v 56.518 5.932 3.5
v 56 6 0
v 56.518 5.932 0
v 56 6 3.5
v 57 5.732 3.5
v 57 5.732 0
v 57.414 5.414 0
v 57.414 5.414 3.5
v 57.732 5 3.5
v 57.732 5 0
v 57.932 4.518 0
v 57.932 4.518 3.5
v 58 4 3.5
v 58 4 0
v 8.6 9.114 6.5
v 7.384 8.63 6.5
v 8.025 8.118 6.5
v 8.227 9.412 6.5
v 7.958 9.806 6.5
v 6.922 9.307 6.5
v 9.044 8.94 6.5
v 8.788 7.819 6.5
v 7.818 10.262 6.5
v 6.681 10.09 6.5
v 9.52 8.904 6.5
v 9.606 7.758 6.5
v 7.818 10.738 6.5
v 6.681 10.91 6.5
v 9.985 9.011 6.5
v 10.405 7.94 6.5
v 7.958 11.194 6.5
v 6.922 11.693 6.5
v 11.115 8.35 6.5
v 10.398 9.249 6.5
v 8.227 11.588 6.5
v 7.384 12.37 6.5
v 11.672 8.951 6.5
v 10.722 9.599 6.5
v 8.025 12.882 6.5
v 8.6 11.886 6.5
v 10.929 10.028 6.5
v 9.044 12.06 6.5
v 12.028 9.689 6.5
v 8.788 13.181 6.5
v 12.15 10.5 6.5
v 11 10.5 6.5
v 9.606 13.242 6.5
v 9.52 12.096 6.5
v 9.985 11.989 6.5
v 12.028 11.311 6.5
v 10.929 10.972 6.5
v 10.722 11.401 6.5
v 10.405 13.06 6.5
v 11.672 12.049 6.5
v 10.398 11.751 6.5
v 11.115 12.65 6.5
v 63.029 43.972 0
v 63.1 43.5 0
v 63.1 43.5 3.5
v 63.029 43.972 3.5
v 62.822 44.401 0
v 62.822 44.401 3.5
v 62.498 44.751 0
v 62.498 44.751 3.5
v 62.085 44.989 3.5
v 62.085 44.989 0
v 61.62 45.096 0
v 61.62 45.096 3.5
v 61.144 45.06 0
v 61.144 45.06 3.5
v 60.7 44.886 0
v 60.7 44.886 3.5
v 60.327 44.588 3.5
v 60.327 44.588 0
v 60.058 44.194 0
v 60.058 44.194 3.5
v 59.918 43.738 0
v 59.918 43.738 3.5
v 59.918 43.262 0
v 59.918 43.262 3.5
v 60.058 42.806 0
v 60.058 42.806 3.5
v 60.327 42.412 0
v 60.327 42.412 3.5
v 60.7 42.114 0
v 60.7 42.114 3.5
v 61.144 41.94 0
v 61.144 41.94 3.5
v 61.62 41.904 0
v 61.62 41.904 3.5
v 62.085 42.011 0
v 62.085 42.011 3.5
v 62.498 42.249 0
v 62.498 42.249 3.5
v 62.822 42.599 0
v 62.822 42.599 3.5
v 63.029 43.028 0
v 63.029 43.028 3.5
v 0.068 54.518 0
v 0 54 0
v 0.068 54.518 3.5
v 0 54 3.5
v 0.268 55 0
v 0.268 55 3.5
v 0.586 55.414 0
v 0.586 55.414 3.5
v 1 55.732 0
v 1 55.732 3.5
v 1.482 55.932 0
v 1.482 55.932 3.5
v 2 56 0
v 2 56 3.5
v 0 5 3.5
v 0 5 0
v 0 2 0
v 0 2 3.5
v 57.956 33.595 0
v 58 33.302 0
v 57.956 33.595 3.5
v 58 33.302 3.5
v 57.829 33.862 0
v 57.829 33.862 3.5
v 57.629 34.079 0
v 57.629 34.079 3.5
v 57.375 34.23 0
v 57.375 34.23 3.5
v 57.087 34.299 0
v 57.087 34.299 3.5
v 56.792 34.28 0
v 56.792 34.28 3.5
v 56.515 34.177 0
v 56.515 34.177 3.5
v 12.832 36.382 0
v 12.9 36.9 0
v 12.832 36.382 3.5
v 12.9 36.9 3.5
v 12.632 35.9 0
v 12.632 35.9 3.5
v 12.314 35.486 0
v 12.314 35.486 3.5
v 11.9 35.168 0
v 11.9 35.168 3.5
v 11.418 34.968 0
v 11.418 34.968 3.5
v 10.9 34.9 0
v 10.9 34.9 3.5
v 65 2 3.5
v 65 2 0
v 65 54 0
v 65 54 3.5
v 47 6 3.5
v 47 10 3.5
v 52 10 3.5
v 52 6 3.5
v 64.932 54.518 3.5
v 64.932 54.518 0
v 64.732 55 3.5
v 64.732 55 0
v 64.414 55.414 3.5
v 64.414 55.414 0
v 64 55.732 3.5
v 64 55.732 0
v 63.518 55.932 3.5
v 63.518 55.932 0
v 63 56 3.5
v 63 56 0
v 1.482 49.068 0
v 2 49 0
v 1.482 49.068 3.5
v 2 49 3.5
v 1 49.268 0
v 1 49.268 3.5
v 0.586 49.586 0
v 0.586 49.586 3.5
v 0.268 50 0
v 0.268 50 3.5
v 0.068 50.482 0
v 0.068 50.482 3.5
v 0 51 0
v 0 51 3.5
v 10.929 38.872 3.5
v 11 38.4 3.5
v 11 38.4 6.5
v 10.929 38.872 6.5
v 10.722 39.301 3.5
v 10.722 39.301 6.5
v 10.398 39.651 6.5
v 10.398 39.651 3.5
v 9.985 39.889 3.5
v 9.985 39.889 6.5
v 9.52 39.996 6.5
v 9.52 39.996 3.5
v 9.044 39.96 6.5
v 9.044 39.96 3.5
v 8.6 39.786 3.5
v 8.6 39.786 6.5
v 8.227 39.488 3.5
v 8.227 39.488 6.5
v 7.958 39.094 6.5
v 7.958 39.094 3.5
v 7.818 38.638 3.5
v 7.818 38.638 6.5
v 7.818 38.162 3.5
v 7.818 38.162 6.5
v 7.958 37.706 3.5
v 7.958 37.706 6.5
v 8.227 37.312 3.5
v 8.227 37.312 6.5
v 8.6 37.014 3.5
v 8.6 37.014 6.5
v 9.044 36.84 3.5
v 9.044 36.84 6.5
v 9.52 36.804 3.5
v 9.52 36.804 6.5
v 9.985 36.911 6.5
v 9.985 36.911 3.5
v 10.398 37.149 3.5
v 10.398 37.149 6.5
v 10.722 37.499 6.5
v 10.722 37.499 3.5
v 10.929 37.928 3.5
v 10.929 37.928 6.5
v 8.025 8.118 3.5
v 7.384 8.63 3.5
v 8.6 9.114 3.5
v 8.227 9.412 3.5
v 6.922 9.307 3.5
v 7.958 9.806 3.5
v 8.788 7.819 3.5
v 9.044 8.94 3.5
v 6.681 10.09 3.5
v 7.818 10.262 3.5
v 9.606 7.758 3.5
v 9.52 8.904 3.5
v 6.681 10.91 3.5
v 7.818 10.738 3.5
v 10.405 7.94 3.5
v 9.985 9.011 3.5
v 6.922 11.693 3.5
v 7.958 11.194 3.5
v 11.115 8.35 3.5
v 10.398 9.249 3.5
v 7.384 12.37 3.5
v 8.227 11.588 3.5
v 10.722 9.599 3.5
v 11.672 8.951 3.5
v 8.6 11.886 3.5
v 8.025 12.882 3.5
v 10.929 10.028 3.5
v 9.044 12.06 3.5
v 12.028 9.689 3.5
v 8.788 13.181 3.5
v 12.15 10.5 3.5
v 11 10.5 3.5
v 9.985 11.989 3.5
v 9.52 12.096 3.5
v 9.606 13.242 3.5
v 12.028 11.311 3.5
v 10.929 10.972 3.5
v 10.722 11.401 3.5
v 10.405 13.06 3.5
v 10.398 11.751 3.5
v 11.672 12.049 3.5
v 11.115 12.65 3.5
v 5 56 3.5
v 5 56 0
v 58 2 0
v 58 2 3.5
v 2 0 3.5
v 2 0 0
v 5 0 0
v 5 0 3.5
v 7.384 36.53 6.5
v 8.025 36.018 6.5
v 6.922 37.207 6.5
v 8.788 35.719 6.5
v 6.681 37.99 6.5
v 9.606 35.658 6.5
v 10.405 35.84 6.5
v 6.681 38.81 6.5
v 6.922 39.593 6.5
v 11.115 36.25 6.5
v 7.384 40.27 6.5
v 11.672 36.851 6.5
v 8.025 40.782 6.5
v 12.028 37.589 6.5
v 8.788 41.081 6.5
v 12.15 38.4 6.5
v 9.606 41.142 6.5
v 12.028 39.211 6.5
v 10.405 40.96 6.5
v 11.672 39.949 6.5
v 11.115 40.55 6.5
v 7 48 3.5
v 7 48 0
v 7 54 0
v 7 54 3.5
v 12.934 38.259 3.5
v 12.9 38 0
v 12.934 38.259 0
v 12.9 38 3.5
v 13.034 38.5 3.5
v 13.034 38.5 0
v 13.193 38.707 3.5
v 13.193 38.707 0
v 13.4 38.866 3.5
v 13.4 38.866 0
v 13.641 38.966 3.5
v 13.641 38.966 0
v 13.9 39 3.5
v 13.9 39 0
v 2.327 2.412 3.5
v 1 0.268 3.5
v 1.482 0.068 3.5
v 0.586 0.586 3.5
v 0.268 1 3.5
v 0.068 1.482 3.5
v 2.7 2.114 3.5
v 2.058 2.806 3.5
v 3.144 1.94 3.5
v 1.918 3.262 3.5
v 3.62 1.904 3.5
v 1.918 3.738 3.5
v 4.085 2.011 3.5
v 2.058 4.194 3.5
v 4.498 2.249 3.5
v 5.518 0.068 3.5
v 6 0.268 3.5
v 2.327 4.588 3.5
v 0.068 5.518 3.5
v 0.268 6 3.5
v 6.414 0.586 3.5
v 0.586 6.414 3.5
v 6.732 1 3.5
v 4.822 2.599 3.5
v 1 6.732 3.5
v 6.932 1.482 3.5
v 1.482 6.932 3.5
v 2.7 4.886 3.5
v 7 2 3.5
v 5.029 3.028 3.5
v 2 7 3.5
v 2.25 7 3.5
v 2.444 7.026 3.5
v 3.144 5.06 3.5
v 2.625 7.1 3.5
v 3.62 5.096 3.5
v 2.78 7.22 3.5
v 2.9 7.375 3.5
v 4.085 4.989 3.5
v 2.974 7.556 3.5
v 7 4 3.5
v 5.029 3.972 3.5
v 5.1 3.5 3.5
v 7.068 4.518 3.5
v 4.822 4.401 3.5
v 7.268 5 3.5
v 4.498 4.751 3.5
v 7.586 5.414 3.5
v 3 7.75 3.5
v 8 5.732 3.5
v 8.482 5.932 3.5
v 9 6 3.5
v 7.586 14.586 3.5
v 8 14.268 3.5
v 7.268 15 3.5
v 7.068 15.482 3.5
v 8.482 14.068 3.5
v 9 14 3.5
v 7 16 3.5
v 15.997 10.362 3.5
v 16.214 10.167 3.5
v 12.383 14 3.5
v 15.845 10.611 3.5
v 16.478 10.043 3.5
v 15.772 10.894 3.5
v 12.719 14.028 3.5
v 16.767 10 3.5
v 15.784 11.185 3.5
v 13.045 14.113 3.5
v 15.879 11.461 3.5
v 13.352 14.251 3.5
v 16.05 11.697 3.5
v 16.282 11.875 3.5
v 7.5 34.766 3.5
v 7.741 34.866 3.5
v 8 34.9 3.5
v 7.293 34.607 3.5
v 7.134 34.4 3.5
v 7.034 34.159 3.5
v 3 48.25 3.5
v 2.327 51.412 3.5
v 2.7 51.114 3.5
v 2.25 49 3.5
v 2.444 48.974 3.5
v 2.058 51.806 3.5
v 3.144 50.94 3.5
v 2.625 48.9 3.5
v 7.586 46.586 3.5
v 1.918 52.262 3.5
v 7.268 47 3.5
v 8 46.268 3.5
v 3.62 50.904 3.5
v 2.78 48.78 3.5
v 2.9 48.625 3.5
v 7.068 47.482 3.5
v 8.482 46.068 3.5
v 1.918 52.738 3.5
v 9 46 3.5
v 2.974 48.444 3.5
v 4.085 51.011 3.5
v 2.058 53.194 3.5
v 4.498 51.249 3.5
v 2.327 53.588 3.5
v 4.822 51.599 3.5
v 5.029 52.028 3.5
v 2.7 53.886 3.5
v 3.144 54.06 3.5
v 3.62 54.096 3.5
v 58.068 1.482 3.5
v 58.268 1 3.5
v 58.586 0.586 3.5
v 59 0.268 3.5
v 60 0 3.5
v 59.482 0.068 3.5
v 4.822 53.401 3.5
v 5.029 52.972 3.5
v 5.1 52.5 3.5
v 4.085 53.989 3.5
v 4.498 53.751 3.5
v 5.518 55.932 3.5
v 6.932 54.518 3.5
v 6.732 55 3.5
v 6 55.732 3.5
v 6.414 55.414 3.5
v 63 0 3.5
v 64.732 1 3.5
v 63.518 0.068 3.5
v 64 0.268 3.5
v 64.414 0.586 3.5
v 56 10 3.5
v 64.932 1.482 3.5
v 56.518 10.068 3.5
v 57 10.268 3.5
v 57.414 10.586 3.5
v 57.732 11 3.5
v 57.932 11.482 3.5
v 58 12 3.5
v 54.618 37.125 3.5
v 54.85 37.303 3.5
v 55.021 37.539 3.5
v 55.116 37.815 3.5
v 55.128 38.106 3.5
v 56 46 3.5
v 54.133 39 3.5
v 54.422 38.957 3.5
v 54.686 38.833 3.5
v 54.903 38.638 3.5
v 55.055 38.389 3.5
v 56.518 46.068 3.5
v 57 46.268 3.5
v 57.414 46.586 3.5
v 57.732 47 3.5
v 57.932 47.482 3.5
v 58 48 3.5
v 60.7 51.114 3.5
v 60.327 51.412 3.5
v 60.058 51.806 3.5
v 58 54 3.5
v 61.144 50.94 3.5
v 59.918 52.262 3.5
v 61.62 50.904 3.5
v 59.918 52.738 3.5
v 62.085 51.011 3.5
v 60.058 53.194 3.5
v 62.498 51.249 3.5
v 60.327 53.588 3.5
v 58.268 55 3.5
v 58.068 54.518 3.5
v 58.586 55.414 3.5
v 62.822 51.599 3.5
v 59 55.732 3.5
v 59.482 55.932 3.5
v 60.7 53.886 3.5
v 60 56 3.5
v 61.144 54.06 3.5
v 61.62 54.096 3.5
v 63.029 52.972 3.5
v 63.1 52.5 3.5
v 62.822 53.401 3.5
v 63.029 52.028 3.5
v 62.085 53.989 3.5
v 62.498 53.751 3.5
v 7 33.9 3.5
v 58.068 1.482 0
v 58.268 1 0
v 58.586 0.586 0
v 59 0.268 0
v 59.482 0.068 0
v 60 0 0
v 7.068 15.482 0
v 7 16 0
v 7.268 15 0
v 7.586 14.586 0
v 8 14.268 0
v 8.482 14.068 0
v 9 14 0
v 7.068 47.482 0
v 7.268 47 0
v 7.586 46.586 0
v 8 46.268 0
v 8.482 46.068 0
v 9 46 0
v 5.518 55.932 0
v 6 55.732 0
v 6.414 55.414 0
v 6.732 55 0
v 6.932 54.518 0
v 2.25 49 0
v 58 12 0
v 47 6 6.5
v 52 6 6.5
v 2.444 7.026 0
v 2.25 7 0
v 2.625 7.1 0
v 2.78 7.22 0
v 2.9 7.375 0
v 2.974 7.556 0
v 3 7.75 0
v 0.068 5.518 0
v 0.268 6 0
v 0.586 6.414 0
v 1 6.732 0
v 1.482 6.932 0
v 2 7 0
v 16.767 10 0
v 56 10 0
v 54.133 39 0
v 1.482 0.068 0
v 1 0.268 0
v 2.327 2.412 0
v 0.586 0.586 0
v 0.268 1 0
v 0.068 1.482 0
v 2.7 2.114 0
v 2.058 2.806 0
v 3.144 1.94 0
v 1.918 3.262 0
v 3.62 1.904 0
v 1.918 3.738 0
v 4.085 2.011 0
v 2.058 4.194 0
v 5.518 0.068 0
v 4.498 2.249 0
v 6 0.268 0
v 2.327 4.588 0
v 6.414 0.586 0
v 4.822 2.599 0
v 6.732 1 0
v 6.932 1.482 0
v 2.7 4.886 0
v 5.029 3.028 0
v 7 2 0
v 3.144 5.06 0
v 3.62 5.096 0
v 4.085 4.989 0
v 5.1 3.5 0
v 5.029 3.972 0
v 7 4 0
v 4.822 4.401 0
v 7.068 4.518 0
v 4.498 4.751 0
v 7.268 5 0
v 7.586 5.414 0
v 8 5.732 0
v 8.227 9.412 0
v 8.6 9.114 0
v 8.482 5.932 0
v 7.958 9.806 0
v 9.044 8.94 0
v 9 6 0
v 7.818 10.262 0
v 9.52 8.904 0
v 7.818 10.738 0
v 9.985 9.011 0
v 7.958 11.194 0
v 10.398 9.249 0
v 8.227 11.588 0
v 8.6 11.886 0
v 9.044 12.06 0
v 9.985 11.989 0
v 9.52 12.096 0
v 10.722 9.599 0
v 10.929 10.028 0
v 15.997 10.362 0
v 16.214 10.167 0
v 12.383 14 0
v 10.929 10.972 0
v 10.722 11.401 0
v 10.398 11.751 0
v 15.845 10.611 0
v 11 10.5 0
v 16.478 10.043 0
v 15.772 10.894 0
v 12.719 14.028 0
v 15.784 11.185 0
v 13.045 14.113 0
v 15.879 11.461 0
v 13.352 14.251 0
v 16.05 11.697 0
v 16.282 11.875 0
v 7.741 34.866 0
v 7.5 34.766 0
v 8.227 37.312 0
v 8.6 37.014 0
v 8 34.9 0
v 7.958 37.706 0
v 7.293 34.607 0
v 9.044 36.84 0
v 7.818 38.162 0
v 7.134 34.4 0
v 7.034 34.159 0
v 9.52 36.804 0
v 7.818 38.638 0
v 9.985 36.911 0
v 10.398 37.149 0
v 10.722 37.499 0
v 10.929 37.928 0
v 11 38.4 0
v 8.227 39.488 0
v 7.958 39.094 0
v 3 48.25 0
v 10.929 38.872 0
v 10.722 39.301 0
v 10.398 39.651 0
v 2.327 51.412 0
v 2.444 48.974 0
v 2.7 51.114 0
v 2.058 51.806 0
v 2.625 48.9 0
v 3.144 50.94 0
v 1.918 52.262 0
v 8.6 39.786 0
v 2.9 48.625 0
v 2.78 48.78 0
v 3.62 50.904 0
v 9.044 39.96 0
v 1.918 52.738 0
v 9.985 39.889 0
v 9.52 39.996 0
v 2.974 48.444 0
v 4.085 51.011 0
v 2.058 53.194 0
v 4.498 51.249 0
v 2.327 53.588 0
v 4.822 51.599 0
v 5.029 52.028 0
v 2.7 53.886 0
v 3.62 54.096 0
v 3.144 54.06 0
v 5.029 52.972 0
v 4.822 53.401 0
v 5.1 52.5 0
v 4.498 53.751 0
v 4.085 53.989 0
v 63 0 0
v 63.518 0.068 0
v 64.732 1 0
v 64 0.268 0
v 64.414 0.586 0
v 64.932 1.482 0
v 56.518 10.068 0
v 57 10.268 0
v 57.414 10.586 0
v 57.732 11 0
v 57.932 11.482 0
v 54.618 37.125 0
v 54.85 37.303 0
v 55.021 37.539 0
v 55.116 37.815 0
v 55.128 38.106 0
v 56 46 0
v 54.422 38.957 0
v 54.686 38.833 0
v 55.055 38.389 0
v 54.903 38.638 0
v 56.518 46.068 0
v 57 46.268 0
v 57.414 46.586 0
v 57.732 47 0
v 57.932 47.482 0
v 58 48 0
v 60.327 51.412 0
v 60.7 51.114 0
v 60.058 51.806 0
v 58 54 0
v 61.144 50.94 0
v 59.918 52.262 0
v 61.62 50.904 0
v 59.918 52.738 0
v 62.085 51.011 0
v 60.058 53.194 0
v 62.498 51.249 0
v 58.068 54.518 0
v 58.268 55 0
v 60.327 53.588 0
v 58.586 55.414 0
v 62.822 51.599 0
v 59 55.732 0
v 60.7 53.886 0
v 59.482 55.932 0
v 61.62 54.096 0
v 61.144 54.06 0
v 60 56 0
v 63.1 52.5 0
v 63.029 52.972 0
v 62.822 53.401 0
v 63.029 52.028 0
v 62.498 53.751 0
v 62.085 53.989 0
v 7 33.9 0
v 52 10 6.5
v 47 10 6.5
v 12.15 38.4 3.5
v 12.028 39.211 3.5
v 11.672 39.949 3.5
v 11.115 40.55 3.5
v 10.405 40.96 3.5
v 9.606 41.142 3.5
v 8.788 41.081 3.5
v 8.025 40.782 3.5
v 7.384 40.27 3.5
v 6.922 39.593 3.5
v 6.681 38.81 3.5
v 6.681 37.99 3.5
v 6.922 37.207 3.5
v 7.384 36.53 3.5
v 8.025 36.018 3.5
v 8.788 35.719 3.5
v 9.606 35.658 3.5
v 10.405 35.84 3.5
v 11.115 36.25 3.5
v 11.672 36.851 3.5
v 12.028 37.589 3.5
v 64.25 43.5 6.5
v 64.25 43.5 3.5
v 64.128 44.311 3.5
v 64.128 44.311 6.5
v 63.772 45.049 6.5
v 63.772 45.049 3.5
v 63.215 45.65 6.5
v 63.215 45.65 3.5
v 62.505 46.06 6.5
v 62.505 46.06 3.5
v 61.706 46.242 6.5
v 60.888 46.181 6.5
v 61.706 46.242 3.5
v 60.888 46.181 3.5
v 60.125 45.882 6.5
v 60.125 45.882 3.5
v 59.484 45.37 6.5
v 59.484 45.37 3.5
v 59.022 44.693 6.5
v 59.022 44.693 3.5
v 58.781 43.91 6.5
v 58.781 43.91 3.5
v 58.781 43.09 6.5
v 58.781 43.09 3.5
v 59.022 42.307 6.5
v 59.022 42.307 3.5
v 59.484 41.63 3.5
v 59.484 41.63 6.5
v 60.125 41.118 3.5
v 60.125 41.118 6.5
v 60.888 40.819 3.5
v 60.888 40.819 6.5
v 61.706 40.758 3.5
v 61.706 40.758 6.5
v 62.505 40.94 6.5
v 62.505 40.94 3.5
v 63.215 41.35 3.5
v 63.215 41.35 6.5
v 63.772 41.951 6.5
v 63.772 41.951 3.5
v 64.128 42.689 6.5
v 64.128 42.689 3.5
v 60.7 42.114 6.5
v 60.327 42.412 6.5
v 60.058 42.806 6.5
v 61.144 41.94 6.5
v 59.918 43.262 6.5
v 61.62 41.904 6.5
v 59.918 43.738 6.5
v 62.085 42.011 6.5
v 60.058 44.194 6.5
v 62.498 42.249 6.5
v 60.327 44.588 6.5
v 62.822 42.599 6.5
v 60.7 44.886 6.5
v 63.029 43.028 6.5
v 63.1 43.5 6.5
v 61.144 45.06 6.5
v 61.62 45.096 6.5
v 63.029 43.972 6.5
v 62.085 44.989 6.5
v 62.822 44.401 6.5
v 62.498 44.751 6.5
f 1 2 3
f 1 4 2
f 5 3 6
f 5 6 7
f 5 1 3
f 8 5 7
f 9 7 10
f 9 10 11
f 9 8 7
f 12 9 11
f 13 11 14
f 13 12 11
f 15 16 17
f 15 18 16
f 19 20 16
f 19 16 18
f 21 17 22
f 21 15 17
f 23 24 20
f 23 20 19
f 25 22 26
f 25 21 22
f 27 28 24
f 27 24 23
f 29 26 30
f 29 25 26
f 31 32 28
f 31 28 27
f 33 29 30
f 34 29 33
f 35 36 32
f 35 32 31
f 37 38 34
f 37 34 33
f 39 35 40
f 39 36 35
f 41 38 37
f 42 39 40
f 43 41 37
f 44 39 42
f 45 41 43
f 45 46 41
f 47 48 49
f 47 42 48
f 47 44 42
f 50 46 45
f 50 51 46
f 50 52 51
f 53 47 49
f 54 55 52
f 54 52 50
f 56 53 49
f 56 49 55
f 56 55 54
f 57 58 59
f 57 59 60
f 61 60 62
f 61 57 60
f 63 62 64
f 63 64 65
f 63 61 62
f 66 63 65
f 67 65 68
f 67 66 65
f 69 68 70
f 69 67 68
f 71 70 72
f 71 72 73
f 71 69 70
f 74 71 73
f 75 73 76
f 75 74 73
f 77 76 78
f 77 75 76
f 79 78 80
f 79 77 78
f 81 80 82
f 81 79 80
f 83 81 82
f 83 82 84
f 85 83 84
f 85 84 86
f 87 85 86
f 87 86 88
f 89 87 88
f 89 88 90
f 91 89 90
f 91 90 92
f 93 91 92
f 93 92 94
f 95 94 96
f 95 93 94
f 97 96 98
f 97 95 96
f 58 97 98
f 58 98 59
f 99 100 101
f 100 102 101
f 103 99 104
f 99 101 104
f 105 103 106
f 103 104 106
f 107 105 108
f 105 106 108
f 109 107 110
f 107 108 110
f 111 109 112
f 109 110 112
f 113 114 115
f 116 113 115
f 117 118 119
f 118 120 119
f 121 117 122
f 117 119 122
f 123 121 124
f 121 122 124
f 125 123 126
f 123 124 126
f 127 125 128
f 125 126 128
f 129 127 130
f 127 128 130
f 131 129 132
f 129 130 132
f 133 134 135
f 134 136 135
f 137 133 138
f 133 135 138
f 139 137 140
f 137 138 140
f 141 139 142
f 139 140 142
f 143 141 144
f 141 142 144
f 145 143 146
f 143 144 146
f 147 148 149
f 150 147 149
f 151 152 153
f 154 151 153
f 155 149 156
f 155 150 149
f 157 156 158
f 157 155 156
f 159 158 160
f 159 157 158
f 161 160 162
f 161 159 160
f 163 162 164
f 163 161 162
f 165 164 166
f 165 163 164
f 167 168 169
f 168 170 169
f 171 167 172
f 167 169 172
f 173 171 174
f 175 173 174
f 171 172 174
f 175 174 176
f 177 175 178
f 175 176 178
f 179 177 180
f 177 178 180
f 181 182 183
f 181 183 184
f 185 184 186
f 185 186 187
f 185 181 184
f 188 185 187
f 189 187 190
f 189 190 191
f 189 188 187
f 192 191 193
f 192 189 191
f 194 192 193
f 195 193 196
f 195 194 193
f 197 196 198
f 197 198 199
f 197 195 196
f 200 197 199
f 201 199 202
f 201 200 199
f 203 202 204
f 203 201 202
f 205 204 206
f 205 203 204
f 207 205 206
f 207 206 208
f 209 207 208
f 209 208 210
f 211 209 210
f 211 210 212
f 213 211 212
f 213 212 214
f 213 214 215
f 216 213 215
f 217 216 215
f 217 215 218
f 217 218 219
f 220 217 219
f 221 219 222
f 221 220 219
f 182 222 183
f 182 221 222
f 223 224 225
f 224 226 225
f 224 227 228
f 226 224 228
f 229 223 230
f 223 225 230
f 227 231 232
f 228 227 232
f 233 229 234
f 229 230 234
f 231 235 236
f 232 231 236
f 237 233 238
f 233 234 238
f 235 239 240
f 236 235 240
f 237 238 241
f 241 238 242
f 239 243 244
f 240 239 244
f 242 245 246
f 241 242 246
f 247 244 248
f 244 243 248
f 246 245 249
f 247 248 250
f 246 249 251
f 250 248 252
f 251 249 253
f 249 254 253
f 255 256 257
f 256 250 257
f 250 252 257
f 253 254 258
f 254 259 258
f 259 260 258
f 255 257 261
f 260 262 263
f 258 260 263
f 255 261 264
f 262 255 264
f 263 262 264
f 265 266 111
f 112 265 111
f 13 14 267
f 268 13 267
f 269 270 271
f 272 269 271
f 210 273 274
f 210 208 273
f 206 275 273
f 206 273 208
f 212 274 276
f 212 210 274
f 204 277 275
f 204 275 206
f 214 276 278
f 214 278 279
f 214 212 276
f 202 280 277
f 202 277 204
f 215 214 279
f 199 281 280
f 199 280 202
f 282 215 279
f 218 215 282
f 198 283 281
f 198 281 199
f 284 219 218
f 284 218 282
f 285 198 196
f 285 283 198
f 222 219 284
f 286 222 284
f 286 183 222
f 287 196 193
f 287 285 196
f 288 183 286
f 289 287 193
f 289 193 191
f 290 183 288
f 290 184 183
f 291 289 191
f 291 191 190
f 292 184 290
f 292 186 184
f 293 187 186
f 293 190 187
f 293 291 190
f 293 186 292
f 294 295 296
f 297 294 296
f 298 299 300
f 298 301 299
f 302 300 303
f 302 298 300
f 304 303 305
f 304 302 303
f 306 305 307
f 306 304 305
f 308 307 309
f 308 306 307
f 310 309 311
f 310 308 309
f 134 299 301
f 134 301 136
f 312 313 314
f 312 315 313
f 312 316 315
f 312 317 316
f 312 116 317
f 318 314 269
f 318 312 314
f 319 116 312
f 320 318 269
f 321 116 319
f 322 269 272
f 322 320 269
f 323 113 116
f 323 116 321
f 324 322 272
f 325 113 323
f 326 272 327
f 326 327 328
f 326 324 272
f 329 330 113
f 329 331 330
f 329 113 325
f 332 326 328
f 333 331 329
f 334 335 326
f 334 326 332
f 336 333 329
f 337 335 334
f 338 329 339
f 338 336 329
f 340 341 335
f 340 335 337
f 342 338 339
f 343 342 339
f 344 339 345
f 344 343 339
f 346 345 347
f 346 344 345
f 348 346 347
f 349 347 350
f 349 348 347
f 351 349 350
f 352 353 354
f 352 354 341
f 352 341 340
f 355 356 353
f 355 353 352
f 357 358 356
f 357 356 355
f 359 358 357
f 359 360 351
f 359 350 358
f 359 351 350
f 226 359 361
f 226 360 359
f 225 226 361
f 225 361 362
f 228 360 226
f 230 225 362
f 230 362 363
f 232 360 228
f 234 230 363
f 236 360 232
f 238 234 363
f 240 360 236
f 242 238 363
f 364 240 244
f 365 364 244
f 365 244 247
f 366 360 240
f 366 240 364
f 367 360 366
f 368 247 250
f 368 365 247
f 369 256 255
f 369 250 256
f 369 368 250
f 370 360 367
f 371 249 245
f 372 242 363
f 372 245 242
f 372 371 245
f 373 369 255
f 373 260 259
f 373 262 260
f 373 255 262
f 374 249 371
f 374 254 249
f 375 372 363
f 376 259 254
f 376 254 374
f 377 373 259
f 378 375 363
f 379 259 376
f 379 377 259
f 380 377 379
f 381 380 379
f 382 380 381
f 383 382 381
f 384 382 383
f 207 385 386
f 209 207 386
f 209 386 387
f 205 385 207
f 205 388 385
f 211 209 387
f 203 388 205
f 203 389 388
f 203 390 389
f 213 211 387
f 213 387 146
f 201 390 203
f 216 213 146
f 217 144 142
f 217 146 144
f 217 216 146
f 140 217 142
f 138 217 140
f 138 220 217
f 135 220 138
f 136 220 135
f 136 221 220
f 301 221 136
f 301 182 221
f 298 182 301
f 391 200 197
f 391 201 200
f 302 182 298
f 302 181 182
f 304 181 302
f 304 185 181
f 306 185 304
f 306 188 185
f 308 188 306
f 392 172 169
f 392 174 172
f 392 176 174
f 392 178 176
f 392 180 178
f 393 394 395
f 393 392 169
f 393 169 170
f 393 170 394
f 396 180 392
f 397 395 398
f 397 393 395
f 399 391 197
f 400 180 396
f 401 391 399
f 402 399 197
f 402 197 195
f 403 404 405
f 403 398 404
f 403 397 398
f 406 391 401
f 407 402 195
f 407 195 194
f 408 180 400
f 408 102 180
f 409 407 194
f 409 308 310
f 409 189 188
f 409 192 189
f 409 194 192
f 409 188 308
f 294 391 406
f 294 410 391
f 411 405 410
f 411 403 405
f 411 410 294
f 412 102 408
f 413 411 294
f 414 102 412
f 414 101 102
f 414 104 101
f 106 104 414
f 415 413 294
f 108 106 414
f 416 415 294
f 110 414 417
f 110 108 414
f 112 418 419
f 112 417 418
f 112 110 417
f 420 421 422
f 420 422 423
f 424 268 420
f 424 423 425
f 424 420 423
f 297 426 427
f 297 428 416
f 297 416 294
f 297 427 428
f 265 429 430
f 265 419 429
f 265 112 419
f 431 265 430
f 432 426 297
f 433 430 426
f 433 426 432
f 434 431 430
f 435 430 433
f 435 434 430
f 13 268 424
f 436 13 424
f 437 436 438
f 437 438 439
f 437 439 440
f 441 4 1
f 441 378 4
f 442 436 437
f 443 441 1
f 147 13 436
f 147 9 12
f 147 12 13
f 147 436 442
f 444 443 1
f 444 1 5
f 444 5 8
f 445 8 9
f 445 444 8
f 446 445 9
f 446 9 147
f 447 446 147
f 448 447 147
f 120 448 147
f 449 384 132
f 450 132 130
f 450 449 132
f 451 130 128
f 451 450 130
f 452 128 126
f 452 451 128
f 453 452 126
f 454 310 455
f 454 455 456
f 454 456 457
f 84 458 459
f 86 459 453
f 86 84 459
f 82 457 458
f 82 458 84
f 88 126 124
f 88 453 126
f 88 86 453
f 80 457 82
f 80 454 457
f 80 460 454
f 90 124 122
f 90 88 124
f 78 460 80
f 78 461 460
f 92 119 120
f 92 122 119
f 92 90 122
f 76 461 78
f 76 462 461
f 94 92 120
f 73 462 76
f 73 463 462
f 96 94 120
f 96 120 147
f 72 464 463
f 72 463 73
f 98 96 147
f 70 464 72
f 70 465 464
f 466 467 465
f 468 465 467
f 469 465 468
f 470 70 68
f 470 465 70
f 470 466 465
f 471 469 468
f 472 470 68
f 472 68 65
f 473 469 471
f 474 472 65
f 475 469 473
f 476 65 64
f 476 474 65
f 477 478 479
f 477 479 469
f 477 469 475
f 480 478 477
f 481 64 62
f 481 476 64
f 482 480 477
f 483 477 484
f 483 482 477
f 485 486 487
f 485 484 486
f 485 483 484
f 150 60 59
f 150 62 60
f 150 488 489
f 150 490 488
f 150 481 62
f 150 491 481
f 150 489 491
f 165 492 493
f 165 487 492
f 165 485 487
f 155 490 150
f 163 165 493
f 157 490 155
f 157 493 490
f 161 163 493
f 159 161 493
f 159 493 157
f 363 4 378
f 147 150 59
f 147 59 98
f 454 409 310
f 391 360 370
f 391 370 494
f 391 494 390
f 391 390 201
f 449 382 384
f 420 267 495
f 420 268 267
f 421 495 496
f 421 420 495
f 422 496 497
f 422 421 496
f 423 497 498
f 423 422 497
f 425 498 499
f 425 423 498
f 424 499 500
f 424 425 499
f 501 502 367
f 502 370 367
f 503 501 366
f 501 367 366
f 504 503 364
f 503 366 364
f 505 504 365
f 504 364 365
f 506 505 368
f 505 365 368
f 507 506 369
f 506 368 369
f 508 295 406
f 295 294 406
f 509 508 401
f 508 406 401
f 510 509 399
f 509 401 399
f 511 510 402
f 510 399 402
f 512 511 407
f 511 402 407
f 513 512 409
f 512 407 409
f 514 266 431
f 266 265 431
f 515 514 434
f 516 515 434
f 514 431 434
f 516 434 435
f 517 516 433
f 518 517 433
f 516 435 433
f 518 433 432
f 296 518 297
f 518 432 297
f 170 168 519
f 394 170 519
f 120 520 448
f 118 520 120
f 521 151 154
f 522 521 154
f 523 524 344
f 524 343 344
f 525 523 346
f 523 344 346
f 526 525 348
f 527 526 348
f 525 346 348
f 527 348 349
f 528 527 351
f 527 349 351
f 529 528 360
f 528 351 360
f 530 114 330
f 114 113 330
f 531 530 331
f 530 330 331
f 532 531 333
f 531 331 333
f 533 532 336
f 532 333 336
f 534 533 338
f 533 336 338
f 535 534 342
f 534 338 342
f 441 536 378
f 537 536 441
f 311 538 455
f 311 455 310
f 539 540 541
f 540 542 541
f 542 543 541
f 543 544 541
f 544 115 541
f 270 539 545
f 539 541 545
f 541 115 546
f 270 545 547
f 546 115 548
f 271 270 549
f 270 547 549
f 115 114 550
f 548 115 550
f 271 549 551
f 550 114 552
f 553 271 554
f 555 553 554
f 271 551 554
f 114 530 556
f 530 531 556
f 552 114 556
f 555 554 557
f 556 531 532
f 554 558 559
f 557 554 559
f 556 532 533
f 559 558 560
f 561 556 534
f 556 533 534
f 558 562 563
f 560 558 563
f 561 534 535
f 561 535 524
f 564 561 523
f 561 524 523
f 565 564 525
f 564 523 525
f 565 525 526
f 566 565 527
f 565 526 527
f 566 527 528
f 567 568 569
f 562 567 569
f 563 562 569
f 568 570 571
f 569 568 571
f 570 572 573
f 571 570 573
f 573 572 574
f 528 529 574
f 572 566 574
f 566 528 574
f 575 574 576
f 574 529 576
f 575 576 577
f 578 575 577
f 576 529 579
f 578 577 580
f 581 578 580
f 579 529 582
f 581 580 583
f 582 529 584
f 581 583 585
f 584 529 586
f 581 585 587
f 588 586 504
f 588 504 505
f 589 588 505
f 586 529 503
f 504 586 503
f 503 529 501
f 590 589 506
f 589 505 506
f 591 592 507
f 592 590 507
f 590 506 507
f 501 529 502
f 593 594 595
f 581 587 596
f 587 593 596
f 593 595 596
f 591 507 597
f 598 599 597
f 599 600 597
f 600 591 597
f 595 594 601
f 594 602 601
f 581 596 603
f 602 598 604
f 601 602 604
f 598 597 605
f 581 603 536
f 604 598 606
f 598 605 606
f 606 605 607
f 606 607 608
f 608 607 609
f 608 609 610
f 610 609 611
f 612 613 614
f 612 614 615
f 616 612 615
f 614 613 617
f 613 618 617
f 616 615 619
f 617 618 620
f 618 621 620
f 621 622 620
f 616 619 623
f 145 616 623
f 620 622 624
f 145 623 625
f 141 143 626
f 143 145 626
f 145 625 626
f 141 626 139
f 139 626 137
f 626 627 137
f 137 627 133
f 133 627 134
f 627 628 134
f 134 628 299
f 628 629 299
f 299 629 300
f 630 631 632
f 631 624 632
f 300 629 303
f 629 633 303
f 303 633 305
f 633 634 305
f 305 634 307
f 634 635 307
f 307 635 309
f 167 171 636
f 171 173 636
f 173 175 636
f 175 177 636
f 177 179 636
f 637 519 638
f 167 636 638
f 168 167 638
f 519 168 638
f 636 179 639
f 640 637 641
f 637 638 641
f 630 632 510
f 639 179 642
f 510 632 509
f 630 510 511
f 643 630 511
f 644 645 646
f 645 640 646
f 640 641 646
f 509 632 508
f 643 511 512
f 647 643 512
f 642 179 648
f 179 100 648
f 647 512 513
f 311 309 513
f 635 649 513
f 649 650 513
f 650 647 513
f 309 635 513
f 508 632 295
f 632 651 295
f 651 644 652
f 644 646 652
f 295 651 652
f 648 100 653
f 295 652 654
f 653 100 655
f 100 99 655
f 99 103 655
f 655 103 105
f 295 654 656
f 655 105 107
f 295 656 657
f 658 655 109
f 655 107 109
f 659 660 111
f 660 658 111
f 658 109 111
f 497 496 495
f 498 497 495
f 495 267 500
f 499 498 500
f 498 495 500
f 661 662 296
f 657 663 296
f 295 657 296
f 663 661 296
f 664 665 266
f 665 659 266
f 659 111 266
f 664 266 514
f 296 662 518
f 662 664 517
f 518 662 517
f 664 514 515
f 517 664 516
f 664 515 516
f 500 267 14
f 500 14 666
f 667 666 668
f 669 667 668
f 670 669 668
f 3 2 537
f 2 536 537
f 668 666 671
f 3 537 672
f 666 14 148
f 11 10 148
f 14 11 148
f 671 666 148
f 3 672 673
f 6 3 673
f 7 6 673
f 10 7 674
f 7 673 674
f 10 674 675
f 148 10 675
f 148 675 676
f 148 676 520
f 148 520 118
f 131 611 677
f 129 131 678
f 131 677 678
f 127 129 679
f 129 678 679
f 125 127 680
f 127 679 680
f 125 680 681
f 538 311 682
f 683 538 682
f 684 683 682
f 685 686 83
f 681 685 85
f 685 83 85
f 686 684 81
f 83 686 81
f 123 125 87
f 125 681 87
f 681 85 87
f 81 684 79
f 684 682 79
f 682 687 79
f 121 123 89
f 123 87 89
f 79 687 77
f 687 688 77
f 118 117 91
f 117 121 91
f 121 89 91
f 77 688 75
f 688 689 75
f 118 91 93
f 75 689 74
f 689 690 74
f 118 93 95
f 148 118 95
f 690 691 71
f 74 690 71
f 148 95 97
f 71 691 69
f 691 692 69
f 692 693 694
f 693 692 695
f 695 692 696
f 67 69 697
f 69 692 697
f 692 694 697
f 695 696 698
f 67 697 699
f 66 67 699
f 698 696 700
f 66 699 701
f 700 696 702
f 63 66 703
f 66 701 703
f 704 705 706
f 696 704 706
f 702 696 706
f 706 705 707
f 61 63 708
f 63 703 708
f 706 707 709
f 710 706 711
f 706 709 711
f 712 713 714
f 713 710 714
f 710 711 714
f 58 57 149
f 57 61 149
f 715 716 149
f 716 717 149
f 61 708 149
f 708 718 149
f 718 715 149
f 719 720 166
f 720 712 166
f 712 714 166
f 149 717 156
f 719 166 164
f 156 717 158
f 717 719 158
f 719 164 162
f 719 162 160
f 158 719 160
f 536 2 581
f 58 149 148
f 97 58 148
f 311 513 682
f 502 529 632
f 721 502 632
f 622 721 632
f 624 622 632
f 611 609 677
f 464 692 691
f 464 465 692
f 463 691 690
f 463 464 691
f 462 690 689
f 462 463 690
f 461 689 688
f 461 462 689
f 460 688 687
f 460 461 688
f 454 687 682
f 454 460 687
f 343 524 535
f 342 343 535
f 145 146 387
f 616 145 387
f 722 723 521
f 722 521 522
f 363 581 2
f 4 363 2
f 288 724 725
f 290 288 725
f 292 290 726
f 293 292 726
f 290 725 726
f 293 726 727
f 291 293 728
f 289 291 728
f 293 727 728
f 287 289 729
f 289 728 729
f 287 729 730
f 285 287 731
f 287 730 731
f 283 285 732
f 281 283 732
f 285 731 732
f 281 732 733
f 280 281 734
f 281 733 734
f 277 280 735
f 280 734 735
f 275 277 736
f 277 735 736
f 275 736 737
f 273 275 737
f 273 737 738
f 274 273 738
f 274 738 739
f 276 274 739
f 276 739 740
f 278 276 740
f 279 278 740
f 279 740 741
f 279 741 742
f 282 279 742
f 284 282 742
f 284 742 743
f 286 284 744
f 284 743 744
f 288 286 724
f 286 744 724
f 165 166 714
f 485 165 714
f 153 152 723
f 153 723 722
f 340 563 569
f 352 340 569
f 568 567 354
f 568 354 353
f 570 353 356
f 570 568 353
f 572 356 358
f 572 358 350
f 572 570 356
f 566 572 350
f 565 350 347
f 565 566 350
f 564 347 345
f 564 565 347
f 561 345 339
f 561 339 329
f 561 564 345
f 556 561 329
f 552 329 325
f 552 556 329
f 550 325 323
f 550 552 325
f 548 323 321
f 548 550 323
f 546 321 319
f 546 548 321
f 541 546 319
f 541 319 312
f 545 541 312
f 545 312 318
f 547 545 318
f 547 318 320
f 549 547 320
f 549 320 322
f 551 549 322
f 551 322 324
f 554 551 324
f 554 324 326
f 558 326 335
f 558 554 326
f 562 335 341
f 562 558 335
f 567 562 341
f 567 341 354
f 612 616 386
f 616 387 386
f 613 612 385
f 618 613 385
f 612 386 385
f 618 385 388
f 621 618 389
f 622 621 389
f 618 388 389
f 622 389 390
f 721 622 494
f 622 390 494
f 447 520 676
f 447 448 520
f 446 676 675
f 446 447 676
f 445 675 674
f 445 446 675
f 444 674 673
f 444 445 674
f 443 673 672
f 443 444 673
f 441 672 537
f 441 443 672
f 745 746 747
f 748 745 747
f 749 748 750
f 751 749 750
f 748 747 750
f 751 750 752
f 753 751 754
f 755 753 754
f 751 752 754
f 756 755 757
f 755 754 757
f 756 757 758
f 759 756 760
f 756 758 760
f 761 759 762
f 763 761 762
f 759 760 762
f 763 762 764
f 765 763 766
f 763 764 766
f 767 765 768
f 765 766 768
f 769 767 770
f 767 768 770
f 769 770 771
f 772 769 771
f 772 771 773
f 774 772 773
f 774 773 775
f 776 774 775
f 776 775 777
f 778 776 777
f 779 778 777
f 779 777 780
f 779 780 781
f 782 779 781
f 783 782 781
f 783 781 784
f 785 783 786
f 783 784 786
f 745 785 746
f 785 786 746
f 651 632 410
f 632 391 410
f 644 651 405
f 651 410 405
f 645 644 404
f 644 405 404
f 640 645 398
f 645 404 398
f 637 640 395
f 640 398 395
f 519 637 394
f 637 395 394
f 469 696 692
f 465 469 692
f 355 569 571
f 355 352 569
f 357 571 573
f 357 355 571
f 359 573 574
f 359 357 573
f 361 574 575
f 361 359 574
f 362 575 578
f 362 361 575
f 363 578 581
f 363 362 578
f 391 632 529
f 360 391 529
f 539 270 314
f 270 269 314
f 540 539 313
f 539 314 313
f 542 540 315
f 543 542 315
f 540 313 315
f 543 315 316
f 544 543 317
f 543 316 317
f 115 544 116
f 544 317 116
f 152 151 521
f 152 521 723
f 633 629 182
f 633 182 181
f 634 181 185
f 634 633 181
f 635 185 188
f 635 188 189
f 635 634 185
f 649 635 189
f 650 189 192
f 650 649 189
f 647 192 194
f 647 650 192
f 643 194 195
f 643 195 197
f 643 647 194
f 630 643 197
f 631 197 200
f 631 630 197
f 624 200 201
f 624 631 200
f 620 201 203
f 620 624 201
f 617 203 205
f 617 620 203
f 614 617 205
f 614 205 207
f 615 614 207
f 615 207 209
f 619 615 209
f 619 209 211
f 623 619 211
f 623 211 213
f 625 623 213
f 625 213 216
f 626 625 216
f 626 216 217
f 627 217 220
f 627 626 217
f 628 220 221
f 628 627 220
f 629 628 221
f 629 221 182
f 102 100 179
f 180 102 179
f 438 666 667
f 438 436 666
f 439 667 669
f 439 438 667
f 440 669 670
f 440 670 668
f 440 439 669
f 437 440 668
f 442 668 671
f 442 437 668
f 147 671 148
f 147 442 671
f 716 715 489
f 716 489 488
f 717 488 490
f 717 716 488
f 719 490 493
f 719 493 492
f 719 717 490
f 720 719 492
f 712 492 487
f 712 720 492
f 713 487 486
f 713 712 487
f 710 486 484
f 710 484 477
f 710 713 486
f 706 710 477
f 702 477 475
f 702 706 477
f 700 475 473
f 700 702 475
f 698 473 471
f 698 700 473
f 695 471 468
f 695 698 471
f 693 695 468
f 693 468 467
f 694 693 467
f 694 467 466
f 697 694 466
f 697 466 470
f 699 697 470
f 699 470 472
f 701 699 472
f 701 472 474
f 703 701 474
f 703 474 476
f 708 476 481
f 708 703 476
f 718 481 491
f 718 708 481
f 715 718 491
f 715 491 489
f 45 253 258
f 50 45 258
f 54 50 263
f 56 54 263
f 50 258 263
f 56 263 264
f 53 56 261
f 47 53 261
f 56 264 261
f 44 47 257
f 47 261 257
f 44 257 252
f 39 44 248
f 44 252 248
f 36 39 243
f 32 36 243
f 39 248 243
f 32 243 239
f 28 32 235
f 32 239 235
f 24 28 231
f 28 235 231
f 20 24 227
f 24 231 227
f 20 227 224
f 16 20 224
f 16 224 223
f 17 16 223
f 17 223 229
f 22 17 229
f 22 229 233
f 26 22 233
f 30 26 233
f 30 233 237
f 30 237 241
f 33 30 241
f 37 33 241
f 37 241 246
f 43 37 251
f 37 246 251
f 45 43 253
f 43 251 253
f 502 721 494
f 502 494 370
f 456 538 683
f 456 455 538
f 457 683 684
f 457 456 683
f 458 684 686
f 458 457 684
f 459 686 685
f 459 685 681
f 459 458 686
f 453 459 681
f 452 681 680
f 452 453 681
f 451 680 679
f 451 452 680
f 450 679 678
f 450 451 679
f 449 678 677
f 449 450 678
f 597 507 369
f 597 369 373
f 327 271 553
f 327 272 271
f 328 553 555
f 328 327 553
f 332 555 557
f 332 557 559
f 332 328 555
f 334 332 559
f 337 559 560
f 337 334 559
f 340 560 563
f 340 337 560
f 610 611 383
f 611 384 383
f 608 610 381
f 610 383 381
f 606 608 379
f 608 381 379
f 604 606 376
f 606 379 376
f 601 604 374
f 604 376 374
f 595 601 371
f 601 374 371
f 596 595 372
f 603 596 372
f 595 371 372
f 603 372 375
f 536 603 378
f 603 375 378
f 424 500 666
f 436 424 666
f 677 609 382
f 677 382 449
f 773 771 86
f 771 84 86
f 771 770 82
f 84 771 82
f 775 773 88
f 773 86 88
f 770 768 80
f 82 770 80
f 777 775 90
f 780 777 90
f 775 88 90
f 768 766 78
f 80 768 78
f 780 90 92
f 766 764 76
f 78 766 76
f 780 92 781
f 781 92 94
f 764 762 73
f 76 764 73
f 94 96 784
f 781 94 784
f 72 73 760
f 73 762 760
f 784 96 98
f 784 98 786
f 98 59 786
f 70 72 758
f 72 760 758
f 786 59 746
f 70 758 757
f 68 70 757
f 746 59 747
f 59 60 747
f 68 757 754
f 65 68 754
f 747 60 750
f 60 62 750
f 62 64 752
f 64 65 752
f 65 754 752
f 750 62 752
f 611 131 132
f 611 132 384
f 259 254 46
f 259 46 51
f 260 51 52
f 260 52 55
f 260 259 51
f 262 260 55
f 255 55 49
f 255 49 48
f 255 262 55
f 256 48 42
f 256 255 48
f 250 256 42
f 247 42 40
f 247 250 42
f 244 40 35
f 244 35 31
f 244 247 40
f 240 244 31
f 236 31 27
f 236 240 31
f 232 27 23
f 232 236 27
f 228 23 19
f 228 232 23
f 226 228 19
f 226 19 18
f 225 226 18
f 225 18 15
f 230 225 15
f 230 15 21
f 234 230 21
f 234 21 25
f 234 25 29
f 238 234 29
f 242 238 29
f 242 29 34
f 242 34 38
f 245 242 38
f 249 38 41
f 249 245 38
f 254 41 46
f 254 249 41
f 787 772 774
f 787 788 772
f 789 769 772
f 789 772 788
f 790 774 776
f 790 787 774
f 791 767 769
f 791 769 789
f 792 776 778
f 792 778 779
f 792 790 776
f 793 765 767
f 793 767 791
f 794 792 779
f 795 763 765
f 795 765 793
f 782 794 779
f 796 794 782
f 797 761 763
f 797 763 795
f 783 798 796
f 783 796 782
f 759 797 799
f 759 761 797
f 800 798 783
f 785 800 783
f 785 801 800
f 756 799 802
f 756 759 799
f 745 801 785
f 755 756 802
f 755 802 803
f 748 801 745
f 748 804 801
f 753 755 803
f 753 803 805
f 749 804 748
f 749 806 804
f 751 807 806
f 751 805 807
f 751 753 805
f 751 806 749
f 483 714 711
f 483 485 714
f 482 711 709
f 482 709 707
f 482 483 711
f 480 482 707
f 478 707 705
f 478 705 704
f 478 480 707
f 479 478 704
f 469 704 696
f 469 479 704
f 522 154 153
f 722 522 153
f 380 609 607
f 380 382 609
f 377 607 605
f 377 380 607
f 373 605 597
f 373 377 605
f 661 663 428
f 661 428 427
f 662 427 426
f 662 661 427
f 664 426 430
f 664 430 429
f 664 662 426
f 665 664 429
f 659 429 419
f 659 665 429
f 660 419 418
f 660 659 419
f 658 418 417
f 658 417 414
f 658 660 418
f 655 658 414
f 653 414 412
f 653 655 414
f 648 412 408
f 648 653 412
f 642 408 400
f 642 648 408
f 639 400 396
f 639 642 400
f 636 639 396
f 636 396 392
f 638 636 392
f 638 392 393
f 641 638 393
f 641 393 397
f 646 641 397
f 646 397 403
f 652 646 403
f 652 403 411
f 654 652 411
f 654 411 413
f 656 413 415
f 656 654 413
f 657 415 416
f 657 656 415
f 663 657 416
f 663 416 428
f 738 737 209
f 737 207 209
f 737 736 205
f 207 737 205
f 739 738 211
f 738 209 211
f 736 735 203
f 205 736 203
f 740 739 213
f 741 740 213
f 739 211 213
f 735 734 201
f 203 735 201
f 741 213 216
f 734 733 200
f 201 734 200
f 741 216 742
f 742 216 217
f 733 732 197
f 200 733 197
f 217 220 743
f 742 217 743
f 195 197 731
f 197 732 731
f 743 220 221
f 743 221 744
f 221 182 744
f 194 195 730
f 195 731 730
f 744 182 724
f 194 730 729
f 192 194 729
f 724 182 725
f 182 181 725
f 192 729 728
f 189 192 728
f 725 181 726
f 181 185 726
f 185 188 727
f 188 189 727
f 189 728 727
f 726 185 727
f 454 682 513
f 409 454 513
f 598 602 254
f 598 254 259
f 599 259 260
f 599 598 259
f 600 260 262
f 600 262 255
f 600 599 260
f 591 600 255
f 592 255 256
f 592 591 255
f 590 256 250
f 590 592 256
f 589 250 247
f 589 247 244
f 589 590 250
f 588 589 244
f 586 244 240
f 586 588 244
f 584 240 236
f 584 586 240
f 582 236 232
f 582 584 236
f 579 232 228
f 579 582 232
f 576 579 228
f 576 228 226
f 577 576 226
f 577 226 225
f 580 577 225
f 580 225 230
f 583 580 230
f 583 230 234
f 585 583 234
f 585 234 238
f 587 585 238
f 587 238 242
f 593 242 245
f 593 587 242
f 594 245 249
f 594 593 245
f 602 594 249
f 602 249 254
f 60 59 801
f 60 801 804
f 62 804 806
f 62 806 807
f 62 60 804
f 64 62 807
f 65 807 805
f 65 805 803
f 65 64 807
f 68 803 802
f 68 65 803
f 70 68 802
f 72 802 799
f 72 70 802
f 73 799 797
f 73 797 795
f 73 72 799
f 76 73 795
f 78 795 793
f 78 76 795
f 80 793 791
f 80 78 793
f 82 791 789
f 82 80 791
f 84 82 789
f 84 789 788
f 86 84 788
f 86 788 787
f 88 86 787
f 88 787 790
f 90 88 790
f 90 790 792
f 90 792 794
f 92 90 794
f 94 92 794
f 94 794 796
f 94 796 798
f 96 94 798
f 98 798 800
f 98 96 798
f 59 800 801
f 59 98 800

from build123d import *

# Parameters (mm, degrees)
SKETCH_R         = 1.6
EXTRUDE_DEPTH    = 3.5
FILLET_1_R       = 2
FILLET_2_R       = 1
FILLET_3_R       = 0.75
SKETCH001_R      = 2.75
SKETCH001_R_2    = 1.6
SKETCH001_W      = 5
SKETCH001_H      = 4
EXTRUDE001_DEPTH = 3


with BuildPart() as fillet_body:
    # Sketch → Extrude (new body)
    with BuildSketch(Plane.XY):
        Polygon((0, 0), (7, 0), (7, 6), (58, 6), (58, 0), (65, 0), (65, 56), (58, 56), (58, 46), (7, 46), (7, 56), (0, 56), (0, 49), (3, 49), (3, 7), (0, 7), align=None)
        with Locations((3.5, 3.5)):
            Circle(SKETCH_R, mode=Mode.SUBTRACT)
        with Locations((3.5, 52.5)):
            Circle(SKETCH_R, mode=Mode.SUBTRACT)
        with Locations((61.5, 52.5)):
            Circle(SKETCH_R, mode=Mode.SUBTRACT)
        with Locations((61.5, 43.5)):
            Circle(SKETCH_R, mode=Mode.SUBTRACT)
        with Locations((9.4, 38.4)):
            Circle(SKETCH_R, mode=Mode.SUBTRACT)
        with Locations((9.4, 10.5)):
            Circle(SKETCH_R, mode=Mode.SUBTRACT)
        Polygon((12.9, 39), (12.9, 34.9), (7, 34.9), (7, 14), (12.9, 14), (58, 39), align=None, mode=Mode.SUBTRACT)
        Polygon((58, 10), (58, 35), (12.9, 10), align=None, mode=Mode.SUBTRACT)
    extrude(amount=EXTRUDE_DEPTH)

    # Fillet 1
    fillet_1_edges = [fillet_body.edges().sort_by_distance(p)[0] for p in [
        (58, 0, 1.75),
        (65, 0, 1.75),
        (65, 56, 1.75),
        (58, 56, 1.75),
        (58, 46, 1.75),
        (7, 46, 1.75),
        (7, 56, 1.75),
        (0, 56, 1.75),
        (0, 49, 1.75),
        (0, 7, 1.75),
        (0, 0, 1.75),
        (7, 0, 1.75),
        (7, 6, 1.75),
        (58, 6, 1.75),
        (12.9, 14, 1.75),
        (7, 14, 1.75),
        (12.9, 34.9, 1.75),
        (58, 10, 1.75),
    ]]
    fillet(fillet_1_edges, radius=FILLET_1_R)

    # Fillet 2
    fillet_2_edges = [fillet_body.edges().sort_by_distance(p)[0] for p in [
        (58, 39, 1.75),
        (12.9, 39, 1.75),
        (7, 34.9, 1.75),
        (58, 35, 1.75),
        (12.9, 10, 1.75),
    ]]
    fillet(fillet_2_edges, radius=FILLET_2_R)

    # Fillet 3
    fillet_3_edges = [fillet_body.edges().sort_by_distance(p)[0] for p in [
        (3, 49, 1.75),
        (3, 7, 1.75),
    ]]
    fillet(fillet_3_edges, radius=FILLET_3_R)


with BuildPart() as extrude001:
    # Sketch001 (on Face5 of Fillet) → Extrude001 (new body)
    with BuildSketch(Plane.XY.offset(3.5)):
        with Locations((9.4, 38.4)):
            Circle(SKETCH001_R)
        with Locations((9.4, 38.4)):
            Circle(SKETCH001_R_2, mode=Mode.SUBTRACT)
        with Locations((61.5, 43.5)):
            Circle(SKETCH001_R)
        with Locations((61.5, 43.5)):
            Circle(SKETCH001_R_2, mode=Mode.SUBTRACT)
        with Locations((9.4, 10.5)):
            Circle(SKETCH001_R)
        with Locations((9.4, 10.5)):
            Circle(SKETCH001_R_2, mode=Mode.SUBTRACT)
        with Locations((49.5, 8)):
            Rectangle(SKETCH001_W, SKETCH001_H)
    extrude(amount=EXTRUDE001_DEPTH)


solid = Compound([fillet_body.part, extrude001.part])
